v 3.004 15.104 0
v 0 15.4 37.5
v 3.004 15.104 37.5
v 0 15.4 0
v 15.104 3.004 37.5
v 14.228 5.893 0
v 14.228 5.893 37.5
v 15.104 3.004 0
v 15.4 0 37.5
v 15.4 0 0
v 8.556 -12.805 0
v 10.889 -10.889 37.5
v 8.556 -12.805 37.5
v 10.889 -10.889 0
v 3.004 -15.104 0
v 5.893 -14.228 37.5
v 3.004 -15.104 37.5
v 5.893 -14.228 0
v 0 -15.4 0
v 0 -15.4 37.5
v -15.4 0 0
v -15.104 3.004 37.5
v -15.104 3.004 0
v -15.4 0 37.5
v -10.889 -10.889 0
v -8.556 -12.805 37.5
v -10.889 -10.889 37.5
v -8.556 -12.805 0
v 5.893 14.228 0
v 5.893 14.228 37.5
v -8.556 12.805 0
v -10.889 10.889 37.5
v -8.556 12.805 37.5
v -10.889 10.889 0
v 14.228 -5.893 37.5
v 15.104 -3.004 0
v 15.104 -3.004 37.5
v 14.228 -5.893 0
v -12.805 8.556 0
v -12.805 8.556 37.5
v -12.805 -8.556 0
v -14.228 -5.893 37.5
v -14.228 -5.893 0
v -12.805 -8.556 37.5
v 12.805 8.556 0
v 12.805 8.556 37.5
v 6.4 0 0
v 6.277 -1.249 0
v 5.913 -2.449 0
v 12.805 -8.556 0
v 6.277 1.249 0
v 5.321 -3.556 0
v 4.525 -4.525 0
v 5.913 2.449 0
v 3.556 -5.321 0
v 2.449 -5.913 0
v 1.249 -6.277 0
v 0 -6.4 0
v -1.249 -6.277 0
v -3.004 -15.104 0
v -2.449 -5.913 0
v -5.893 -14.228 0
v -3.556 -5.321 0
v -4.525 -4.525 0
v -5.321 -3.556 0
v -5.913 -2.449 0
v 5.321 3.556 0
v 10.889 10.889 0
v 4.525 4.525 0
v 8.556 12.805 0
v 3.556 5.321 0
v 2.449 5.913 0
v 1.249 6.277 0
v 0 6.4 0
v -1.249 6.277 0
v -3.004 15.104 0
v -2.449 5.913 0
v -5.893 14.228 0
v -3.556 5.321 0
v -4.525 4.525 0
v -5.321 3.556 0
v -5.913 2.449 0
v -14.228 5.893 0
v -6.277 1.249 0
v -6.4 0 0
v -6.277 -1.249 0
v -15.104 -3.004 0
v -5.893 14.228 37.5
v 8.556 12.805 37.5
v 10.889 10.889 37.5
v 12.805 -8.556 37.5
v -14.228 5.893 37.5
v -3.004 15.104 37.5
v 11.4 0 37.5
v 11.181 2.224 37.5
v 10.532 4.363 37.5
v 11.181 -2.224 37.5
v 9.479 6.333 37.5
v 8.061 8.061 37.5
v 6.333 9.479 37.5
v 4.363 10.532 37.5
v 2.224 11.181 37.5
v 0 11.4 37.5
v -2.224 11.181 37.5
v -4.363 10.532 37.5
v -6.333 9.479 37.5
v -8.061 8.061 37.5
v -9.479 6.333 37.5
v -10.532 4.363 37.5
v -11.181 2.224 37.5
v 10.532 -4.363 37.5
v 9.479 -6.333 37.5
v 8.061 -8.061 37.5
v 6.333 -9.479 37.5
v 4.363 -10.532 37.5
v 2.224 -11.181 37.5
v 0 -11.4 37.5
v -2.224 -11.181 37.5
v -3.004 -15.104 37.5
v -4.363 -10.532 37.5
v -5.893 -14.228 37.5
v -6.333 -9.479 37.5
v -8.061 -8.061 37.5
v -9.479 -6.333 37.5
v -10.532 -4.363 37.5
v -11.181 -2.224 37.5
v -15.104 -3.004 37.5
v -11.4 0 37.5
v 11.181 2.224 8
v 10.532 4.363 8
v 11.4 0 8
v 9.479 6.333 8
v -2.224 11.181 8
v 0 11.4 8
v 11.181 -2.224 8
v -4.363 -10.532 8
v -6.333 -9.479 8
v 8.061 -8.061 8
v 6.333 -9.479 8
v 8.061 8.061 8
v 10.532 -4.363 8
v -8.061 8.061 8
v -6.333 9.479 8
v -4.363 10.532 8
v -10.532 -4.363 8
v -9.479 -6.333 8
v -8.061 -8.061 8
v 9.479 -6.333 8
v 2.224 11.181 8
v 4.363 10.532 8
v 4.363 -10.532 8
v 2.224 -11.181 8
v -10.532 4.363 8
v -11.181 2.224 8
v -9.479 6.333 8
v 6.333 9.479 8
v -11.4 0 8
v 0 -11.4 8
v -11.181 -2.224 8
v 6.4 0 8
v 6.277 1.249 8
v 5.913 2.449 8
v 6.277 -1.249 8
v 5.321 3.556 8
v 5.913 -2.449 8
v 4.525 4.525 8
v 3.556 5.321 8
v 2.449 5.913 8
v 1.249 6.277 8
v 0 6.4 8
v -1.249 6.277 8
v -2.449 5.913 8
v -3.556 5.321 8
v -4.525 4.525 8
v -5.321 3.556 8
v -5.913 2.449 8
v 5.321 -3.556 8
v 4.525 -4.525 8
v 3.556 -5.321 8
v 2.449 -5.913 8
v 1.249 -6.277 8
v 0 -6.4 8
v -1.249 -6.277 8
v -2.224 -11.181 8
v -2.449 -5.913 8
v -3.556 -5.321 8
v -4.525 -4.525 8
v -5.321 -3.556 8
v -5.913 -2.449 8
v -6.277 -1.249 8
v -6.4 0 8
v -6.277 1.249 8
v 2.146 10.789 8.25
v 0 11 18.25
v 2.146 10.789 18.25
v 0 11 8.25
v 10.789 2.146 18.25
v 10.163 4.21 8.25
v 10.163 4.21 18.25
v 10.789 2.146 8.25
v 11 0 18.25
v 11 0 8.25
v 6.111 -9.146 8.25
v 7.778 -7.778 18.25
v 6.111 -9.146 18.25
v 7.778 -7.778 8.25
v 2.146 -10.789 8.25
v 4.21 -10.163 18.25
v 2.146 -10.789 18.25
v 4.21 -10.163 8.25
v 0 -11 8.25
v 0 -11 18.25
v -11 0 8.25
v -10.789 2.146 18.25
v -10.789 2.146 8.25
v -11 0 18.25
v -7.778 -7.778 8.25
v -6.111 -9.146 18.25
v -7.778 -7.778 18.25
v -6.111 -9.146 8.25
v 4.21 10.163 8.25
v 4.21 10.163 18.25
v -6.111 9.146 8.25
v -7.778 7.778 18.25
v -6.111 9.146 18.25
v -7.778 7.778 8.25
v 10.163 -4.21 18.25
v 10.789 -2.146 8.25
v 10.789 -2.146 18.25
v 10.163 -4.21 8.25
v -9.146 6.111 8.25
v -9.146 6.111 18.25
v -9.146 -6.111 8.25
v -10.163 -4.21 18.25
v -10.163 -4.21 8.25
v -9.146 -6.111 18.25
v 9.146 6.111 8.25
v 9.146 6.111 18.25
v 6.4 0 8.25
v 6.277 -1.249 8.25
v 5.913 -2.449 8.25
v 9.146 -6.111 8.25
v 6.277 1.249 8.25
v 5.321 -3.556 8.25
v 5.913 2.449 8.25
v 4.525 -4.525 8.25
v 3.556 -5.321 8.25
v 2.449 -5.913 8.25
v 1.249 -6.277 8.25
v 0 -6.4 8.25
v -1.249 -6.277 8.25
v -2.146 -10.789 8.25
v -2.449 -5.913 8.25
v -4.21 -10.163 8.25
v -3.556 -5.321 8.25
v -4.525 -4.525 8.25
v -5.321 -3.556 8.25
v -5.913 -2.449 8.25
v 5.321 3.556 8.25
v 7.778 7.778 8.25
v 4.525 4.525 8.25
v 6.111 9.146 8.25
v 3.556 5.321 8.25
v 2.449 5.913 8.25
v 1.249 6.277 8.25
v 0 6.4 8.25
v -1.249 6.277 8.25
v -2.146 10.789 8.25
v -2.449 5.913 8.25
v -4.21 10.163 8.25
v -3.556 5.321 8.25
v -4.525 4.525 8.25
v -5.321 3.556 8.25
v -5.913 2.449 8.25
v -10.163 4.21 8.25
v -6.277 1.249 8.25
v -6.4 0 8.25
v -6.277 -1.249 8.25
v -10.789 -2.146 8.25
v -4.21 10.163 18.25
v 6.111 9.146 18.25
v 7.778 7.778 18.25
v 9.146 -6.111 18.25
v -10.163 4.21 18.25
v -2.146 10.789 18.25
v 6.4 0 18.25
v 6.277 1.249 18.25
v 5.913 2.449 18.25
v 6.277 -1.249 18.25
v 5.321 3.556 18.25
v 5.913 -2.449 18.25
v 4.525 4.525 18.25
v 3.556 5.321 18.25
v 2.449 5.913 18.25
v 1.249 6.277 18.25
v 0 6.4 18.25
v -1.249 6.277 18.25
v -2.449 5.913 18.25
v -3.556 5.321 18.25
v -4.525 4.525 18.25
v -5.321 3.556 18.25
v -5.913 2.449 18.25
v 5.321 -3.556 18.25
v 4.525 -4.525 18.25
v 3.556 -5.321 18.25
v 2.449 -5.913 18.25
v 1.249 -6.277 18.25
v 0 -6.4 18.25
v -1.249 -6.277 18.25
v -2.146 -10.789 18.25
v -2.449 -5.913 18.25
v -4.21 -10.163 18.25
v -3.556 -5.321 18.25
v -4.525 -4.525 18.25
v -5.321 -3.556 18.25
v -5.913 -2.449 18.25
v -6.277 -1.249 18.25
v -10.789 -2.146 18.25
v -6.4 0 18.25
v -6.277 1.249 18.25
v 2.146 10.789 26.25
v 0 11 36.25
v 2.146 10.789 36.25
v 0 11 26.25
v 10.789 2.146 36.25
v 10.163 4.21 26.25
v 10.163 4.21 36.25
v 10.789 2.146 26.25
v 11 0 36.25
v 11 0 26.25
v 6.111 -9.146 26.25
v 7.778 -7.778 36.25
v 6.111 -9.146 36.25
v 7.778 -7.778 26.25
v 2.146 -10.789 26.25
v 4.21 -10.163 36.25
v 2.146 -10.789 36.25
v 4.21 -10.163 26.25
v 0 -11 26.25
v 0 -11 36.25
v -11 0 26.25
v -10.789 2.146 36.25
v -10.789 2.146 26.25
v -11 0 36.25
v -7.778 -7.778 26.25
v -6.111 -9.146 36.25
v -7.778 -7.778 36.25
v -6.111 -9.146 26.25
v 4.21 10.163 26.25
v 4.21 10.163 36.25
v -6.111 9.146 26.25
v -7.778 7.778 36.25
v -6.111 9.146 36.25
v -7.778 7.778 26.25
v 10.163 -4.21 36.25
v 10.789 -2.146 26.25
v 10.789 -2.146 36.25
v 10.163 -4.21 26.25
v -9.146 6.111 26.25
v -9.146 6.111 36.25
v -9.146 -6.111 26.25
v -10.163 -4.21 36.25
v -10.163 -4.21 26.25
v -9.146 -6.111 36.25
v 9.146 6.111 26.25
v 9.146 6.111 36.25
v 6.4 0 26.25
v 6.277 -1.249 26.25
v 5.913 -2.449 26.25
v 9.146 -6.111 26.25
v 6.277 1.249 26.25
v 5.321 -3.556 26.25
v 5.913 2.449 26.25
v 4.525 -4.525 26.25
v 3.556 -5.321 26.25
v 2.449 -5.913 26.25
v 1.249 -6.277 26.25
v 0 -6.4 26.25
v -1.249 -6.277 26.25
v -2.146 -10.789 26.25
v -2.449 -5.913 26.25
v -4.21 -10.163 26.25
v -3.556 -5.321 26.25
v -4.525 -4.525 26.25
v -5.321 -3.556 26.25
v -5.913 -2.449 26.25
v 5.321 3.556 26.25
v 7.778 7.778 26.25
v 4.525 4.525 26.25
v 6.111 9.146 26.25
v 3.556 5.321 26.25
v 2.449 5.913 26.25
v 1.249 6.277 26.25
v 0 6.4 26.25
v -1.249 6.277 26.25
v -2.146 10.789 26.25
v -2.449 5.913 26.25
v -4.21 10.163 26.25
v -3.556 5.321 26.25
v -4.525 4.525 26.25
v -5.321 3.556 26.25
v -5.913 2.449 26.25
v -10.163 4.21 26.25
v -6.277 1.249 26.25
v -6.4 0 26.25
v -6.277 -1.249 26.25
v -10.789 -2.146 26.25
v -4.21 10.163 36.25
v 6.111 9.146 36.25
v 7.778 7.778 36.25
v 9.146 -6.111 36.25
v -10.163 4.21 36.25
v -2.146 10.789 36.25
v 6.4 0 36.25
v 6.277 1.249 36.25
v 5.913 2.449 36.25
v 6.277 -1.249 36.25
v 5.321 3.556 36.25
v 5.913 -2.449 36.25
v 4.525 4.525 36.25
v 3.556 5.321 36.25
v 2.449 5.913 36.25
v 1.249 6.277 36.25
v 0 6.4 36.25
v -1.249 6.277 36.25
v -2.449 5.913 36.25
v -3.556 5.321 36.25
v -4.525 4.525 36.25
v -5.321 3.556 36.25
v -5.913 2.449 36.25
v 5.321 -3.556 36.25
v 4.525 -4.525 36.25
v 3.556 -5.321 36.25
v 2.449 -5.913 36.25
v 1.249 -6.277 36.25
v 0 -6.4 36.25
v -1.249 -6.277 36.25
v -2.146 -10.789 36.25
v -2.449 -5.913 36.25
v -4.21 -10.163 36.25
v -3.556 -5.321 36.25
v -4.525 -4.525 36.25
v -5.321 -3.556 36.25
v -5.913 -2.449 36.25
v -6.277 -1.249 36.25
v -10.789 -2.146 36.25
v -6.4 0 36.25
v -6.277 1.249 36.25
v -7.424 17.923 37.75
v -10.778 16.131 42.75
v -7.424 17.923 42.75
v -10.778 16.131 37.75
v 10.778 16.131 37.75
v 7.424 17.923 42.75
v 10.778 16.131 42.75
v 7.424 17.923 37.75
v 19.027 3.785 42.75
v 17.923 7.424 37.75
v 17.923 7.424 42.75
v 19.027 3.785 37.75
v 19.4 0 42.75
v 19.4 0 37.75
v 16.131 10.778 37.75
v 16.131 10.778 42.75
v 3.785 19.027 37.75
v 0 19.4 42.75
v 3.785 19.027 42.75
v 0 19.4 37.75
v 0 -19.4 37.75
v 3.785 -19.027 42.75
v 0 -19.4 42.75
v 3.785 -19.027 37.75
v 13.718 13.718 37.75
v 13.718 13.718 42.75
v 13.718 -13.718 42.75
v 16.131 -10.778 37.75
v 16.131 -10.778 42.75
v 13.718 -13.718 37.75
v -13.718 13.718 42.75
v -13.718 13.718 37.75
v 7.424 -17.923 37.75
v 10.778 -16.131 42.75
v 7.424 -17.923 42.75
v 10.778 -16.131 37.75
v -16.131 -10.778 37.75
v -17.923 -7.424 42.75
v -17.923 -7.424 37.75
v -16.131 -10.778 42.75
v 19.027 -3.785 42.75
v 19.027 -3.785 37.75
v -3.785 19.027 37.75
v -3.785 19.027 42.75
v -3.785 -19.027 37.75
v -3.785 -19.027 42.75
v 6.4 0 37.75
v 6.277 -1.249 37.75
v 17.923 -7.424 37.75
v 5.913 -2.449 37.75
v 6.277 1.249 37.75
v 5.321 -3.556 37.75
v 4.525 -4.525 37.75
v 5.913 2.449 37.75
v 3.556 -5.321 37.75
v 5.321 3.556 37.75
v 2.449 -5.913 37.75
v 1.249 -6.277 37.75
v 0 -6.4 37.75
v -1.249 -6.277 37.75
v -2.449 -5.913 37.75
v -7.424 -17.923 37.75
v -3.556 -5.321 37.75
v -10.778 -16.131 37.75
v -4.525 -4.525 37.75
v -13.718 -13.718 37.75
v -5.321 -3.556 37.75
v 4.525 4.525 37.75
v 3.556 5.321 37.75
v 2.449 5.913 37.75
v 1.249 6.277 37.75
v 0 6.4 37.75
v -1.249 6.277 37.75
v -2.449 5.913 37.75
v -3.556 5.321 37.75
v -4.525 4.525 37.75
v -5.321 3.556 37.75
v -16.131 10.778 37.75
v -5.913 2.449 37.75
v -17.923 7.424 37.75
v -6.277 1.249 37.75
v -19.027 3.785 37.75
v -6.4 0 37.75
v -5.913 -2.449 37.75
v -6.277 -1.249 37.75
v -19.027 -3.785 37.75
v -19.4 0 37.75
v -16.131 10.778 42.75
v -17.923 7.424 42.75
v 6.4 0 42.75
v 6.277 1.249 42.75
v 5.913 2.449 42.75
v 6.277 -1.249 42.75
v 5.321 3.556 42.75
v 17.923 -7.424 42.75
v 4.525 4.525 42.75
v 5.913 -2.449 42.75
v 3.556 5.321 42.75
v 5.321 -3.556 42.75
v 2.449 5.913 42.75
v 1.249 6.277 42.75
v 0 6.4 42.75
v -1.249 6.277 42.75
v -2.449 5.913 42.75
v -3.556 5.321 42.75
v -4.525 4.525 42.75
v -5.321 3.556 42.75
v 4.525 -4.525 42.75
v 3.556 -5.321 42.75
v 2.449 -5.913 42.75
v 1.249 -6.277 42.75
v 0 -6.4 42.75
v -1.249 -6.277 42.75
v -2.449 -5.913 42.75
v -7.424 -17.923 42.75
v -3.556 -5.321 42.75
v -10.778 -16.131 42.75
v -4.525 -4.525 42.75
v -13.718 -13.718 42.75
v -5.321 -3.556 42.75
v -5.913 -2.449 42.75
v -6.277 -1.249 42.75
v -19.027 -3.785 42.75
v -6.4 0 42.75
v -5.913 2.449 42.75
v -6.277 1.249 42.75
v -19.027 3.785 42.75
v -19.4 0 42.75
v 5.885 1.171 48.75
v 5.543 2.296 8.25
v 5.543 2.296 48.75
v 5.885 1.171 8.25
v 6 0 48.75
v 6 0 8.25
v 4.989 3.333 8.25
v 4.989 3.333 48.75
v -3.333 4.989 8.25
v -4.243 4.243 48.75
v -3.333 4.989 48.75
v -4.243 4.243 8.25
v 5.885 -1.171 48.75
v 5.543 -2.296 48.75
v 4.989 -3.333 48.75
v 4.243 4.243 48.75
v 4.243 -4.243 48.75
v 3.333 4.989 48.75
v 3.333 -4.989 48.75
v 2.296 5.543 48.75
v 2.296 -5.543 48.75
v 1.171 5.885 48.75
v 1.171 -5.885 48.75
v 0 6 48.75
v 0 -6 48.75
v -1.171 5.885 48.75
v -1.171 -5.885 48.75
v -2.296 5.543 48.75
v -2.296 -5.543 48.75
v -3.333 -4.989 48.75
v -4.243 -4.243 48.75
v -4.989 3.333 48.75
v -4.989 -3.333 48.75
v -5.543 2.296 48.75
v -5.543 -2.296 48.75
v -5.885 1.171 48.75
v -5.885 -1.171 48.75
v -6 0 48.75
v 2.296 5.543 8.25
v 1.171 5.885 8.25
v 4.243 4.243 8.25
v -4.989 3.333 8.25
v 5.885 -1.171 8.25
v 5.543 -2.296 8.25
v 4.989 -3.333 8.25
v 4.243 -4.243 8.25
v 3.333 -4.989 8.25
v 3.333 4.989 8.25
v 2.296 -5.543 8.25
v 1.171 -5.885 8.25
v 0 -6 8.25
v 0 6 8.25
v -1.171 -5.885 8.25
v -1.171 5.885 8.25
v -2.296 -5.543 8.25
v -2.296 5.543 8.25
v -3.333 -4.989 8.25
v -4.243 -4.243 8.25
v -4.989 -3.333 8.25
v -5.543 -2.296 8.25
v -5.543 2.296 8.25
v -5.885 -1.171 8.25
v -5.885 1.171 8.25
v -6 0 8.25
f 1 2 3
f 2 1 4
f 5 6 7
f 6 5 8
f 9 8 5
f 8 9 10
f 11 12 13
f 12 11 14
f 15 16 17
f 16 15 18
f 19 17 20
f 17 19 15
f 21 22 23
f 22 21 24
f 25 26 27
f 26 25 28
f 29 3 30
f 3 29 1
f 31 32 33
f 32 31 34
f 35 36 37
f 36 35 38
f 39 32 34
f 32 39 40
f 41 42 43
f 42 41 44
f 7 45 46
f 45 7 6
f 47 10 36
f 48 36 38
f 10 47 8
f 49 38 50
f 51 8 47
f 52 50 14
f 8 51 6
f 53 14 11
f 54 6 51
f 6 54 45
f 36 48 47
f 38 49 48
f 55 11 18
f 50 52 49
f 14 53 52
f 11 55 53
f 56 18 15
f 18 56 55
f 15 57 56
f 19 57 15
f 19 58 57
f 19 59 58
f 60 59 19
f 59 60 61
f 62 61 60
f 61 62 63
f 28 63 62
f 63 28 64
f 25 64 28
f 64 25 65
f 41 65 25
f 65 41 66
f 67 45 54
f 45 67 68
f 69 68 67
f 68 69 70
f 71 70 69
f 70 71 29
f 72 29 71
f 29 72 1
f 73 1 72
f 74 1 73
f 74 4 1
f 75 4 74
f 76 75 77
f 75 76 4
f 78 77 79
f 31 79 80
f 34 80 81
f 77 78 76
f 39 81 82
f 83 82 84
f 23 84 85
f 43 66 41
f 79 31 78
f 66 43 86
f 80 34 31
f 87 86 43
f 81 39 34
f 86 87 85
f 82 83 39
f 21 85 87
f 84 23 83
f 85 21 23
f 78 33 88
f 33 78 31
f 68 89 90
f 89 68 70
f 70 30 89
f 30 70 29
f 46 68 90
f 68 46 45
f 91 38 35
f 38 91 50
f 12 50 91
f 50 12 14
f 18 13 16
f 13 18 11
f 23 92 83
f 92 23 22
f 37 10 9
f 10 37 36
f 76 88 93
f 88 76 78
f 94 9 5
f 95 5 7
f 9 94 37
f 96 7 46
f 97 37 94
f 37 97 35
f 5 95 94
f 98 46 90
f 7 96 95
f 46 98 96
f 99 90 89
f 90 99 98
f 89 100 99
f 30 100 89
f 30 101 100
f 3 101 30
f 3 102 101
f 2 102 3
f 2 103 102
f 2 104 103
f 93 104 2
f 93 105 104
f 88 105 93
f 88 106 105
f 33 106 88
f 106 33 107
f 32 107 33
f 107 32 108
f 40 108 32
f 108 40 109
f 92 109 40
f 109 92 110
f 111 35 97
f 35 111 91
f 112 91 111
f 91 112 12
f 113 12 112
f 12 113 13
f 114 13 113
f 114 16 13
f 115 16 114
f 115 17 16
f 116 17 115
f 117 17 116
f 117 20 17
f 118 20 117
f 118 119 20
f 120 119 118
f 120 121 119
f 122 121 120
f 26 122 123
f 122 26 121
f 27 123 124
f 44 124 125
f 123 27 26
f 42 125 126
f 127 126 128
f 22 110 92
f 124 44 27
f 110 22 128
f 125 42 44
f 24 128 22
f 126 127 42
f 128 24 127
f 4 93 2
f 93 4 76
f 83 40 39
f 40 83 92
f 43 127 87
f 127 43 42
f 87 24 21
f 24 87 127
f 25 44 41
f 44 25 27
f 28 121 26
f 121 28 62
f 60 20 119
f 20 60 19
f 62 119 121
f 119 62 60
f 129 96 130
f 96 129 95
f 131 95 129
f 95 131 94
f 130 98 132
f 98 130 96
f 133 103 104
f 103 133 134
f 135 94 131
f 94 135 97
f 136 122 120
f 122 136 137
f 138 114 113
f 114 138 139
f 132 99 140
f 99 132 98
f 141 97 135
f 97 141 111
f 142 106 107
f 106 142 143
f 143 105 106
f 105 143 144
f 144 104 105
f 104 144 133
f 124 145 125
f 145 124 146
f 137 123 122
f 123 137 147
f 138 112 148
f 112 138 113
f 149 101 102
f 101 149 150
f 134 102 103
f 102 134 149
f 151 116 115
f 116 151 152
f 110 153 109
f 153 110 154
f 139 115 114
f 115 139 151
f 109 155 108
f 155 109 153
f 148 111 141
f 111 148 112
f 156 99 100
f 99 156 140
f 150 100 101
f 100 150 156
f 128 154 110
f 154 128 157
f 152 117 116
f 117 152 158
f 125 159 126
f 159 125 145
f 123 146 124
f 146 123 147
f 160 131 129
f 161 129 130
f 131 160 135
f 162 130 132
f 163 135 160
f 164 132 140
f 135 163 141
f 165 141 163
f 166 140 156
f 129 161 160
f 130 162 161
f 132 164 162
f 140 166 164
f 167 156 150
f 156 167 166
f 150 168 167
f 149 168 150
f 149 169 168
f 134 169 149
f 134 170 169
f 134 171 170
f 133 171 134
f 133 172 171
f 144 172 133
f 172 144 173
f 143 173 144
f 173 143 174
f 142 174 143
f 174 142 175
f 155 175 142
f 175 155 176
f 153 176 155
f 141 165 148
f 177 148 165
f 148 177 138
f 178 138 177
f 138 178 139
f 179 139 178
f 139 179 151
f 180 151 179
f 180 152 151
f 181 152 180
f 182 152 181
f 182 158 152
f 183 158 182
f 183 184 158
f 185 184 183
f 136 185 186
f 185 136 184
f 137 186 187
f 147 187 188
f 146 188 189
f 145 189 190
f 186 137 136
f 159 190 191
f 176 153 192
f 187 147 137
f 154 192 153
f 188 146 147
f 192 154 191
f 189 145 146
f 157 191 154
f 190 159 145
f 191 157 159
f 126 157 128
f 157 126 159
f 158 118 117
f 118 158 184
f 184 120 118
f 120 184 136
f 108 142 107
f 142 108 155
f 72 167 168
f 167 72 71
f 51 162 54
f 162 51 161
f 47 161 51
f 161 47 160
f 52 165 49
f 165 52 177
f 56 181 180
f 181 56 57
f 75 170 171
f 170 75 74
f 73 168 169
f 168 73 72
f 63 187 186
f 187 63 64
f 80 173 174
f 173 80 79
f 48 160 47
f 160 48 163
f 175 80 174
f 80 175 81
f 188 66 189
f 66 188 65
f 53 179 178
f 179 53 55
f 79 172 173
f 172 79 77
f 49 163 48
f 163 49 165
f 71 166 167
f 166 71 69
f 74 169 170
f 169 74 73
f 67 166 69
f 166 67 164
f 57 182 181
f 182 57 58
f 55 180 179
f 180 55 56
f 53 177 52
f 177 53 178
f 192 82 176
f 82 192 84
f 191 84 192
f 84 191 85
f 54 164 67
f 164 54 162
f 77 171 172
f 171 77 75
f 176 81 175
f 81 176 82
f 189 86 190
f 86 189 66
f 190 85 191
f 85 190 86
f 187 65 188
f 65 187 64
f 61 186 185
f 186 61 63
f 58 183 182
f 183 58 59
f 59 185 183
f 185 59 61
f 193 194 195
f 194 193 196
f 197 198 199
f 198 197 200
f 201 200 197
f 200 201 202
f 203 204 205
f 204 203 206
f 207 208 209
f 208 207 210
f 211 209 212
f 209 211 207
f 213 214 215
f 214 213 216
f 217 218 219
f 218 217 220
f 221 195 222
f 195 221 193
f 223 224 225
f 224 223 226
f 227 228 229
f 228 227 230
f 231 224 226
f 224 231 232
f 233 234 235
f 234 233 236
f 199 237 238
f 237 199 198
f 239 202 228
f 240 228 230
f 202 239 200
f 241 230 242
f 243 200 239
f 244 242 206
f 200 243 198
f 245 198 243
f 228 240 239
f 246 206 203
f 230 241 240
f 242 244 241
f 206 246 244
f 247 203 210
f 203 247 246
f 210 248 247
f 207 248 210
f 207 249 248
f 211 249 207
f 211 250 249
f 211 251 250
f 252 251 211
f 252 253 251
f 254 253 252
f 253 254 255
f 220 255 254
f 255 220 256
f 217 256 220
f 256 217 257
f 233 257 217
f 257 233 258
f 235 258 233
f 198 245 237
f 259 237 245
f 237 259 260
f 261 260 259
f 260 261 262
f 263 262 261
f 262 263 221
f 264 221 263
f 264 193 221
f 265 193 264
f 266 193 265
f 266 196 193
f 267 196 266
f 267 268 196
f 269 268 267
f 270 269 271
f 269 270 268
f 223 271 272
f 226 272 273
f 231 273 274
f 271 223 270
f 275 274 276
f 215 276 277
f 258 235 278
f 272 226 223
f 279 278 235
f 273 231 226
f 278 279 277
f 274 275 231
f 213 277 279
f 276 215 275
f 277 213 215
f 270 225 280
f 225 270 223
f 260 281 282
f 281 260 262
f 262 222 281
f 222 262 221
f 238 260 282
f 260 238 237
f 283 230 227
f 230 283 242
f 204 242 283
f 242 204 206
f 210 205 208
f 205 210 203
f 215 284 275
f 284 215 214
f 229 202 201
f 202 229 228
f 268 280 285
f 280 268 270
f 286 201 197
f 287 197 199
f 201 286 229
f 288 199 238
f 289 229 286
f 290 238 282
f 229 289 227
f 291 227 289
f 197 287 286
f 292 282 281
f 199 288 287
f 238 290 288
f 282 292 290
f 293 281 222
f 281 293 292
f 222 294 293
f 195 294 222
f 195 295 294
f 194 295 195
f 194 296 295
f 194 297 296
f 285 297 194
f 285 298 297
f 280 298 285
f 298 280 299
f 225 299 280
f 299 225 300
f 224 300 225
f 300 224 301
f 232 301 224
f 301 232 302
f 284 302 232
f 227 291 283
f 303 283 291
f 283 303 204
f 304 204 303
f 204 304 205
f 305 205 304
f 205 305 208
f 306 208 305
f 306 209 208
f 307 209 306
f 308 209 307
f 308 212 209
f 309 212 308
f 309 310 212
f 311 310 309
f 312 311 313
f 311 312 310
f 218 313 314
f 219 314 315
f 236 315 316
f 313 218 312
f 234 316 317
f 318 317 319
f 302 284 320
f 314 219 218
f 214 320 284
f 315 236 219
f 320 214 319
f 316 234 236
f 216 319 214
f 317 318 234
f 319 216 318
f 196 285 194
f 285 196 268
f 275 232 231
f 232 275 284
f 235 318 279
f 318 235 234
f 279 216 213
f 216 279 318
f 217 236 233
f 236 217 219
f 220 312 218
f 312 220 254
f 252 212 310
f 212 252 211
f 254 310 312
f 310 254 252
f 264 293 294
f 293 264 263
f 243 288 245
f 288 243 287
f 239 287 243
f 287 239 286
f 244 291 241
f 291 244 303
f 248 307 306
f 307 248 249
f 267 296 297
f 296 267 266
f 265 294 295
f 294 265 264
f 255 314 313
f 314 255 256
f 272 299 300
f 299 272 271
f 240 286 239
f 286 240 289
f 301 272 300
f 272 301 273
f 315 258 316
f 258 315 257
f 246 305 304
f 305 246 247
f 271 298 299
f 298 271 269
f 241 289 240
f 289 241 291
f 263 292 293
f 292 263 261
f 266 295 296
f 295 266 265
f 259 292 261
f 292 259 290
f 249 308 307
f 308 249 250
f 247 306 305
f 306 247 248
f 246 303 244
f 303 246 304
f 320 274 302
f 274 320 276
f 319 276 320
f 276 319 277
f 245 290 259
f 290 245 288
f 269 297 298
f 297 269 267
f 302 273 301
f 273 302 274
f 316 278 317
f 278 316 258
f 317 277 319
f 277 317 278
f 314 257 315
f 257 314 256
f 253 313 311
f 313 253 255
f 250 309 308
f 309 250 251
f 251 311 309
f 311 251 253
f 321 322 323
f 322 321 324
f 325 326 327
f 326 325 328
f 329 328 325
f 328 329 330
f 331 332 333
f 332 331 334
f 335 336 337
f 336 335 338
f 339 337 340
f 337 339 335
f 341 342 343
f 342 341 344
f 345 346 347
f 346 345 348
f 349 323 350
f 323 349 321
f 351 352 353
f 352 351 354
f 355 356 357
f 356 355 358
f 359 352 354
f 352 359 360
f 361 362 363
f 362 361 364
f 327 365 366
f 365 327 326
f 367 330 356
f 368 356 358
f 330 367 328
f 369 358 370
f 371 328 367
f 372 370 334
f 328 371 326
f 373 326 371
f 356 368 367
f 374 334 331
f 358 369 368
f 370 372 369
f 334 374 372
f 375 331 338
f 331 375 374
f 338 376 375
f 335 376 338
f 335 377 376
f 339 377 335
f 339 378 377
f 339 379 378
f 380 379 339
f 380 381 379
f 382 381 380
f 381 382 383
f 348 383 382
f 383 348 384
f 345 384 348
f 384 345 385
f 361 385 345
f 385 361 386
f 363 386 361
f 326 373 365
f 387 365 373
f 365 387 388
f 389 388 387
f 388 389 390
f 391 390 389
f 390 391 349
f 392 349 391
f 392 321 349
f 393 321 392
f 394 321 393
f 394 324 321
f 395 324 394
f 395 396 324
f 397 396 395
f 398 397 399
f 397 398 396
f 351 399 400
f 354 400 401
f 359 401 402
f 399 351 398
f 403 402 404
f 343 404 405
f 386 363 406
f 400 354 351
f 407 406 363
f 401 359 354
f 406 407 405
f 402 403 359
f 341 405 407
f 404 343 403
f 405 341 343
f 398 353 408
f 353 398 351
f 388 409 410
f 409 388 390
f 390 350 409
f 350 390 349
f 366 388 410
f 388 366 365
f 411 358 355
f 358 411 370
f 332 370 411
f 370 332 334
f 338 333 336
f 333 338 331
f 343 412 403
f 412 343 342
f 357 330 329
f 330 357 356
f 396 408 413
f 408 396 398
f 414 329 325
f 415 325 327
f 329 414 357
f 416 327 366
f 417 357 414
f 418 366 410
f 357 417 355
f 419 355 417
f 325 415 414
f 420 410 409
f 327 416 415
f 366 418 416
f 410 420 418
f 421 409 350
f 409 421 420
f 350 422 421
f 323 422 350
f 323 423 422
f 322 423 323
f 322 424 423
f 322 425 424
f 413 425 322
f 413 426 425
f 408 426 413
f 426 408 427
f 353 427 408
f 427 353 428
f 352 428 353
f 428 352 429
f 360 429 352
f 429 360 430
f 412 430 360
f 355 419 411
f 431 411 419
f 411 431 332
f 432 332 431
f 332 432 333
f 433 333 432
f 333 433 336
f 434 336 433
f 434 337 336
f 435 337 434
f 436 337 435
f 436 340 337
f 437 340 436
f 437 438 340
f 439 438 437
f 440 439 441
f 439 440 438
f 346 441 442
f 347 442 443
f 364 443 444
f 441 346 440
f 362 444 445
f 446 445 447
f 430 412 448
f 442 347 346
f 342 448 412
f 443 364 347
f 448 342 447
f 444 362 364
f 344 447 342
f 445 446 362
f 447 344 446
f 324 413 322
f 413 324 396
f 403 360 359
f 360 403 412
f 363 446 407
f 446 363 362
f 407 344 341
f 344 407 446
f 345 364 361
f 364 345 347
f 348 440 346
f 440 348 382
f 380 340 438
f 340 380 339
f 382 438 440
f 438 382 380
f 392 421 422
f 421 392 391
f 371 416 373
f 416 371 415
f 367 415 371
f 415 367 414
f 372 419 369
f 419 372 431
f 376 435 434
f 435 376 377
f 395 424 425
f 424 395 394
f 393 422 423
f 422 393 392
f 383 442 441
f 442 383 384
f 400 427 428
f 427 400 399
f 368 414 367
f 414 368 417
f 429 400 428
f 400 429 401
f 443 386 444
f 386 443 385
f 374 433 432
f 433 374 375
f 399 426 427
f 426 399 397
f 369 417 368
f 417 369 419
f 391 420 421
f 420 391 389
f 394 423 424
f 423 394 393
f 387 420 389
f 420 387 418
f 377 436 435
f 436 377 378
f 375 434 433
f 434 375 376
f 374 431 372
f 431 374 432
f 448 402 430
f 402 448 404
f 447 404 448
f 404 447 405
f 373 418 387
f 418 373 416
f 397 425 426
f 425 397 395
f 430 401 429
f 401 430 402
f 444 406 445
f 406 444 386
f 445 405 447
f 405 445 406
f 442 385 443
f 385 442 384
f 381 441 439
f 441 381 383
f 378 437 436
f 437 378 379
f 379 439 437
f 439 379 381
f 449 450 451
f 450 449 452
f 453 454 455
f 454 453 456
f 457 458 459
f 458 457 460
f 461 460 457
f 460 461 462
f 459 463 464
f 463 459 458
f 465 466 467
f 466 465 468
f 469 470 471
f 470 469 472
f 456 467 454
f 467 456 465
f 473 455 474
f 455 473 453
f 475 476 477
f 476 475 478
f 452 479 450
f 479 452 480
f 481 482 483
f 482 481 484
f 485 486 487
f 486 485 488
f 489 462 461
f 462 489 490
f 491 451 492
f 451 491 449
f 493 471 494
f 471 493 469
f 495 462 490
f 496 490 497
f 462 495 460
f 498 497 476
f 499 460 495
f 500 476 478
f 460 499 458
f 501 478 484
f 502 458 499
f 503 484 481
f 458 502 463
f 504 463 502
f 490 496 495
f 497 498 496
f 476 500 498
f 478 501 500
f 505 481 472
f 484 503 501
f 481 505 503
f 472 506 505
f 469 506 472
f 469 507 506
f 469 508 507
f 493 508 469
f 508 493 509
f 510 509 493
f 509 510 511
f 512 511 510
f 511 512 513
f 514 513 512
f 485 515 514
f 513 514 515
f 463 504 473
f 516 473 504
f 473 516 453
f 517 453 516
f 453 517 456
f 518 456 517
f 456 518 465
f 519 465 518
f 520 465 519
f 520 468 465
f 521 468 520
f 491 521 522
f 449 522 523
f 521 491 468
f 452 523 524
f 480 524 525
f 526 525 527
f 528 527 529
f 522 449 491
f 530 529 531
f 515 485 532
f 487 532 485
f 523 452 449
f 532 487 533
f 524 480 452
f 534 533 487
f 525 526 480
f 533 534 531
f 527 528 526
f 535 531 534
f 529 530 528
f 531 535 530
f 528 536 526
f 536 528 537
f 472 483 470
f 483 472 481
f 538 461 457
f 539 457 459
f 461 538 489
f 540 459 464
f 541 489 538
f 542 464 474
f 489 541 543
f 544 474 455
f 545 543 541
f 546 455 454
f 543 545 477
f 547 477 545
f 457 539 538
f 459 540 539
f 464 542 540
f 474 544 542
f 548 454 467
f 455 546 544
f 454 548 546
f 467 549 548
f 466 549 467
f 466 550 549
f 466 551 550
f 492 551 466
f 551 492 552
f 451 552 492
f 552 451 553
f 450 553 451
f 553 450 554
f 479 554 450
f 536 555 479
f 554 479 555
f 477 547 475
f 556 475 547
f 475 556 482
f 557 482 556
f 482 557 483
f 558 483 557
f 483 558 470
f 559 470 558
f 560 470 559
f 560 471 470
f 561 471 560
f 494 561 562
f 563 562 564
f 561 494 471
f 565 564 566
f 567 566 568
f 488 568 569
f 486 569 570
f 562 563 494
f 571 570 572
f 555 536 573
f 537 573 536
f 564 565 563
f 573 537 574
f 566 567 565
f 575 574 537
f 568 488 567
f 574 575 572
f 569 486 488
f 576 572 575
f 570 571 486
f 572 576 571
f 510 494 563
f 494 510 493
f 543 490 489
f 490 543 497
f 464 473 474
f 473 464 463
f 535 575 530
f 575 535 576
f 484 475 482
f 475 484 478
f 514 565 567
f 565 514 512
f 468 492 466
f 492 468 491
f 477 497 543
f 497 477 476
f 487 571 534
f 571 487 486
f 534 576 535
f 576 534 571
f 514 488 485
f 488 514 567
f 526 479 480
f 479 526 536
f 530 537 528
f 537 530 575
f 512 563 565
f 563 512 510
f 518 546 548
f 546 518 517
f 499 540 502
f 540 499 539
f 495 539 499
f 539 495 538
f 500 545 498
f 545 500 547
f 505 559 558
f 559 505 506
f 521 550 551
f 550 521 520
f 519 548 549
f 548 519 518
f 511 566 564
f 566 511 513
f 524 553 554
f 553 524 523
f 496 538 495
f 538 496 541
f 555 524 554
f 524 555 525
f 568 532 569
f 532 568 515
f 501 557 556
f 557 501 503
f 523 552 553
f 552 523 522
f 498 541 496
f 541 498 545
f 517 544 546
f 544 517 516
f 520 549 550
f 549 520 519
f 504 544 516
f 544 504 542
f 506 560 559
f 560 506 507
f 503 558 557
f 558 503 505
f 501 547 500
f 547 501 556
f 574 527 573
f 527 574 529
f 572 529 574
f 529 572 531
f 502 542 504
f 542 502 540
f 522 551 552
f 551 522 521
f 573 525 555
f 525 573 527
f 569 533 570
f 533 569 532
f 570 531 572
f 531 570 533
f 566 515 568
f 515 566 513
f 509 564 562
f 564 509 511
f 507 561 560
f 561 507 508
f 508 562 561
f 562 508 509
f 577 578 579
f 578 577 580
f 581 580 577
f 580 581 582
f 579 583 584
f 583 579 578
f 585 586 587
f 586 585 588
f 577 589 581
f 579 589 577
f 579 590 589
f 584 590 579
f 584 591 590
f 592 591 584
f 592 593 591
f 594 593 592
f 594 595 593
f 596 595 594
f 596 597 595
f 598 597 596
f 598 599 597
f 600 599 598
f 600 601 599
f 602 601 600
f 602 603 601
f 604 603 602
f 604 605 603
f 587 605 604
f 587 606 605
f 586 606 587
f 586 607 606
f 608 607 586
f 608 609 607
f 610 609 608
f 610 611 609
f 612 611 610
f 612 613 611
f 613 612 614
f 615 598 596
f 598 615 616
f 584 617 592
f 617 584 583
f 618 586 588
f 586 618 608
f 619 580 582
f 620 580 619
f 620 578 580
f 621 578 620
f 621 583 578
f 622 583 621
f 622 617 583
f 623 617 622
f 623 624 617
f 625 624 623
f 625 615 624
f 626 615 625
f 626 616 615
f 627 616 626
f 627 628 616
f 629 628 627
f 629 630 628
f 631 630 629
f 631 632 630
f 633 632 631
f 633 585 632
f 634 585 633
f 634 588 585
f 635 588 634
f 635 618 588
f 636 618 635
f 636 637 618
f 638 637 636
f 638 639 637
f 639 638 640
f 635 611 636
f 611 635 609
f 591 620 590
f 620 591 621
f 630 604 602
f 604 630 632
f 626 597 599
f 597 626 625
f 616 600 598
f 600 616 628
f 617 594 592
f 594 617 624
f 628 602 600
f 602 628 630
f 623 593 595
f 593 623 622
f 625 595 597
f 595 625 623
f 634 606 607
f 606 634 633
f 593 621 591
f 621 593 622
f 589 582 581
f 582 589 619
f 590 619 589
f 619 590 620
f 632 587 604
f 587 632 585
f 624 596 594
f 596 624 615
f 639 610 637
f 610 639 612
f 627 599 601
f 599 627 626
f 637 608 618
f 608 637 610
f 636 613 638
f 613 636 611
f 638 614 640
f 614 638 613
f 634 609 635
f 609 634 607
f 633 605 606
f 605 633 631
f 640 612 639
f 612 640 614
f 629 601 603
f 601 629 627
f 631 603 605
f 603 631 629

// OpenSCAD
$fn = 32;

// ------------------------------------------------------------------------
// Shaft station: cup d30.8 x 37.5 mm, shaft d12
// Every part is its own module, assembly() places every instance.
// ------------------------------------------------------------------------

// --- part 1 ---
module housing_cup() {
  difference() {
    cylinder(h = 37.5, d = 30.8);
    translate([0, 0, 8]) cylinder(h = 30.5, d = 22.8);
    translate([0, 0, -1]) cylinder(h = 10, d = 12.8);
  }
}

// --- part 2 ---
module bearing_lower() {
  difference() {
      translate([0, 0, 0]) cylinder(h = 10, d = 22);
      translate([0, 0, -1]) cylinder(h = 12, d = 12.8);
    }
}

// --- part 3 ---
module bearing_upper() {
  difference() {
      translate([0, 0, 0]) cylinder(h = 10, d = 22);
      translate([0, 0, -1]) cylinder(h = 12, d = 12.8);
    }
}

// --- part 4 ---
module station_shaft() {
  translate([0, 0, -20.25]) cylinder(h = 40.5, d = 12);
}

// --- part 5 ---
module station_cover() {
  difference() {
    cylinder(h = 5, d = 38.8);
    translate([0, 0, -1]) cylinder(h = 7, d = 12.8);
  }
}

// --- assembly ---
module assembly() {
  color([0.80, 0.24, 0.20]) translate([0, 0, 0]) rotate([0, 0, 0]) housing_cup();
  color([0.20, 0.45, 0.75]) translate([0, 0, 8.25]) rotate([0, 0, 0]) bearing_lower();
  color([0.25, 0.62, 0.32]) translate([0, 0, 26.25]) rotate([0, 0, 0]) bearing_upper();
  color([0.92, 0.70, 0.18]) translate([0, 0, 28.5]) rotate([0, 0, 0]) station_shaft();
  color([0.58, 0.35, 0.70]) translate([0, 0, 37.75]) rotate([0, 0, 0]) station_cover();
}

assembly();
